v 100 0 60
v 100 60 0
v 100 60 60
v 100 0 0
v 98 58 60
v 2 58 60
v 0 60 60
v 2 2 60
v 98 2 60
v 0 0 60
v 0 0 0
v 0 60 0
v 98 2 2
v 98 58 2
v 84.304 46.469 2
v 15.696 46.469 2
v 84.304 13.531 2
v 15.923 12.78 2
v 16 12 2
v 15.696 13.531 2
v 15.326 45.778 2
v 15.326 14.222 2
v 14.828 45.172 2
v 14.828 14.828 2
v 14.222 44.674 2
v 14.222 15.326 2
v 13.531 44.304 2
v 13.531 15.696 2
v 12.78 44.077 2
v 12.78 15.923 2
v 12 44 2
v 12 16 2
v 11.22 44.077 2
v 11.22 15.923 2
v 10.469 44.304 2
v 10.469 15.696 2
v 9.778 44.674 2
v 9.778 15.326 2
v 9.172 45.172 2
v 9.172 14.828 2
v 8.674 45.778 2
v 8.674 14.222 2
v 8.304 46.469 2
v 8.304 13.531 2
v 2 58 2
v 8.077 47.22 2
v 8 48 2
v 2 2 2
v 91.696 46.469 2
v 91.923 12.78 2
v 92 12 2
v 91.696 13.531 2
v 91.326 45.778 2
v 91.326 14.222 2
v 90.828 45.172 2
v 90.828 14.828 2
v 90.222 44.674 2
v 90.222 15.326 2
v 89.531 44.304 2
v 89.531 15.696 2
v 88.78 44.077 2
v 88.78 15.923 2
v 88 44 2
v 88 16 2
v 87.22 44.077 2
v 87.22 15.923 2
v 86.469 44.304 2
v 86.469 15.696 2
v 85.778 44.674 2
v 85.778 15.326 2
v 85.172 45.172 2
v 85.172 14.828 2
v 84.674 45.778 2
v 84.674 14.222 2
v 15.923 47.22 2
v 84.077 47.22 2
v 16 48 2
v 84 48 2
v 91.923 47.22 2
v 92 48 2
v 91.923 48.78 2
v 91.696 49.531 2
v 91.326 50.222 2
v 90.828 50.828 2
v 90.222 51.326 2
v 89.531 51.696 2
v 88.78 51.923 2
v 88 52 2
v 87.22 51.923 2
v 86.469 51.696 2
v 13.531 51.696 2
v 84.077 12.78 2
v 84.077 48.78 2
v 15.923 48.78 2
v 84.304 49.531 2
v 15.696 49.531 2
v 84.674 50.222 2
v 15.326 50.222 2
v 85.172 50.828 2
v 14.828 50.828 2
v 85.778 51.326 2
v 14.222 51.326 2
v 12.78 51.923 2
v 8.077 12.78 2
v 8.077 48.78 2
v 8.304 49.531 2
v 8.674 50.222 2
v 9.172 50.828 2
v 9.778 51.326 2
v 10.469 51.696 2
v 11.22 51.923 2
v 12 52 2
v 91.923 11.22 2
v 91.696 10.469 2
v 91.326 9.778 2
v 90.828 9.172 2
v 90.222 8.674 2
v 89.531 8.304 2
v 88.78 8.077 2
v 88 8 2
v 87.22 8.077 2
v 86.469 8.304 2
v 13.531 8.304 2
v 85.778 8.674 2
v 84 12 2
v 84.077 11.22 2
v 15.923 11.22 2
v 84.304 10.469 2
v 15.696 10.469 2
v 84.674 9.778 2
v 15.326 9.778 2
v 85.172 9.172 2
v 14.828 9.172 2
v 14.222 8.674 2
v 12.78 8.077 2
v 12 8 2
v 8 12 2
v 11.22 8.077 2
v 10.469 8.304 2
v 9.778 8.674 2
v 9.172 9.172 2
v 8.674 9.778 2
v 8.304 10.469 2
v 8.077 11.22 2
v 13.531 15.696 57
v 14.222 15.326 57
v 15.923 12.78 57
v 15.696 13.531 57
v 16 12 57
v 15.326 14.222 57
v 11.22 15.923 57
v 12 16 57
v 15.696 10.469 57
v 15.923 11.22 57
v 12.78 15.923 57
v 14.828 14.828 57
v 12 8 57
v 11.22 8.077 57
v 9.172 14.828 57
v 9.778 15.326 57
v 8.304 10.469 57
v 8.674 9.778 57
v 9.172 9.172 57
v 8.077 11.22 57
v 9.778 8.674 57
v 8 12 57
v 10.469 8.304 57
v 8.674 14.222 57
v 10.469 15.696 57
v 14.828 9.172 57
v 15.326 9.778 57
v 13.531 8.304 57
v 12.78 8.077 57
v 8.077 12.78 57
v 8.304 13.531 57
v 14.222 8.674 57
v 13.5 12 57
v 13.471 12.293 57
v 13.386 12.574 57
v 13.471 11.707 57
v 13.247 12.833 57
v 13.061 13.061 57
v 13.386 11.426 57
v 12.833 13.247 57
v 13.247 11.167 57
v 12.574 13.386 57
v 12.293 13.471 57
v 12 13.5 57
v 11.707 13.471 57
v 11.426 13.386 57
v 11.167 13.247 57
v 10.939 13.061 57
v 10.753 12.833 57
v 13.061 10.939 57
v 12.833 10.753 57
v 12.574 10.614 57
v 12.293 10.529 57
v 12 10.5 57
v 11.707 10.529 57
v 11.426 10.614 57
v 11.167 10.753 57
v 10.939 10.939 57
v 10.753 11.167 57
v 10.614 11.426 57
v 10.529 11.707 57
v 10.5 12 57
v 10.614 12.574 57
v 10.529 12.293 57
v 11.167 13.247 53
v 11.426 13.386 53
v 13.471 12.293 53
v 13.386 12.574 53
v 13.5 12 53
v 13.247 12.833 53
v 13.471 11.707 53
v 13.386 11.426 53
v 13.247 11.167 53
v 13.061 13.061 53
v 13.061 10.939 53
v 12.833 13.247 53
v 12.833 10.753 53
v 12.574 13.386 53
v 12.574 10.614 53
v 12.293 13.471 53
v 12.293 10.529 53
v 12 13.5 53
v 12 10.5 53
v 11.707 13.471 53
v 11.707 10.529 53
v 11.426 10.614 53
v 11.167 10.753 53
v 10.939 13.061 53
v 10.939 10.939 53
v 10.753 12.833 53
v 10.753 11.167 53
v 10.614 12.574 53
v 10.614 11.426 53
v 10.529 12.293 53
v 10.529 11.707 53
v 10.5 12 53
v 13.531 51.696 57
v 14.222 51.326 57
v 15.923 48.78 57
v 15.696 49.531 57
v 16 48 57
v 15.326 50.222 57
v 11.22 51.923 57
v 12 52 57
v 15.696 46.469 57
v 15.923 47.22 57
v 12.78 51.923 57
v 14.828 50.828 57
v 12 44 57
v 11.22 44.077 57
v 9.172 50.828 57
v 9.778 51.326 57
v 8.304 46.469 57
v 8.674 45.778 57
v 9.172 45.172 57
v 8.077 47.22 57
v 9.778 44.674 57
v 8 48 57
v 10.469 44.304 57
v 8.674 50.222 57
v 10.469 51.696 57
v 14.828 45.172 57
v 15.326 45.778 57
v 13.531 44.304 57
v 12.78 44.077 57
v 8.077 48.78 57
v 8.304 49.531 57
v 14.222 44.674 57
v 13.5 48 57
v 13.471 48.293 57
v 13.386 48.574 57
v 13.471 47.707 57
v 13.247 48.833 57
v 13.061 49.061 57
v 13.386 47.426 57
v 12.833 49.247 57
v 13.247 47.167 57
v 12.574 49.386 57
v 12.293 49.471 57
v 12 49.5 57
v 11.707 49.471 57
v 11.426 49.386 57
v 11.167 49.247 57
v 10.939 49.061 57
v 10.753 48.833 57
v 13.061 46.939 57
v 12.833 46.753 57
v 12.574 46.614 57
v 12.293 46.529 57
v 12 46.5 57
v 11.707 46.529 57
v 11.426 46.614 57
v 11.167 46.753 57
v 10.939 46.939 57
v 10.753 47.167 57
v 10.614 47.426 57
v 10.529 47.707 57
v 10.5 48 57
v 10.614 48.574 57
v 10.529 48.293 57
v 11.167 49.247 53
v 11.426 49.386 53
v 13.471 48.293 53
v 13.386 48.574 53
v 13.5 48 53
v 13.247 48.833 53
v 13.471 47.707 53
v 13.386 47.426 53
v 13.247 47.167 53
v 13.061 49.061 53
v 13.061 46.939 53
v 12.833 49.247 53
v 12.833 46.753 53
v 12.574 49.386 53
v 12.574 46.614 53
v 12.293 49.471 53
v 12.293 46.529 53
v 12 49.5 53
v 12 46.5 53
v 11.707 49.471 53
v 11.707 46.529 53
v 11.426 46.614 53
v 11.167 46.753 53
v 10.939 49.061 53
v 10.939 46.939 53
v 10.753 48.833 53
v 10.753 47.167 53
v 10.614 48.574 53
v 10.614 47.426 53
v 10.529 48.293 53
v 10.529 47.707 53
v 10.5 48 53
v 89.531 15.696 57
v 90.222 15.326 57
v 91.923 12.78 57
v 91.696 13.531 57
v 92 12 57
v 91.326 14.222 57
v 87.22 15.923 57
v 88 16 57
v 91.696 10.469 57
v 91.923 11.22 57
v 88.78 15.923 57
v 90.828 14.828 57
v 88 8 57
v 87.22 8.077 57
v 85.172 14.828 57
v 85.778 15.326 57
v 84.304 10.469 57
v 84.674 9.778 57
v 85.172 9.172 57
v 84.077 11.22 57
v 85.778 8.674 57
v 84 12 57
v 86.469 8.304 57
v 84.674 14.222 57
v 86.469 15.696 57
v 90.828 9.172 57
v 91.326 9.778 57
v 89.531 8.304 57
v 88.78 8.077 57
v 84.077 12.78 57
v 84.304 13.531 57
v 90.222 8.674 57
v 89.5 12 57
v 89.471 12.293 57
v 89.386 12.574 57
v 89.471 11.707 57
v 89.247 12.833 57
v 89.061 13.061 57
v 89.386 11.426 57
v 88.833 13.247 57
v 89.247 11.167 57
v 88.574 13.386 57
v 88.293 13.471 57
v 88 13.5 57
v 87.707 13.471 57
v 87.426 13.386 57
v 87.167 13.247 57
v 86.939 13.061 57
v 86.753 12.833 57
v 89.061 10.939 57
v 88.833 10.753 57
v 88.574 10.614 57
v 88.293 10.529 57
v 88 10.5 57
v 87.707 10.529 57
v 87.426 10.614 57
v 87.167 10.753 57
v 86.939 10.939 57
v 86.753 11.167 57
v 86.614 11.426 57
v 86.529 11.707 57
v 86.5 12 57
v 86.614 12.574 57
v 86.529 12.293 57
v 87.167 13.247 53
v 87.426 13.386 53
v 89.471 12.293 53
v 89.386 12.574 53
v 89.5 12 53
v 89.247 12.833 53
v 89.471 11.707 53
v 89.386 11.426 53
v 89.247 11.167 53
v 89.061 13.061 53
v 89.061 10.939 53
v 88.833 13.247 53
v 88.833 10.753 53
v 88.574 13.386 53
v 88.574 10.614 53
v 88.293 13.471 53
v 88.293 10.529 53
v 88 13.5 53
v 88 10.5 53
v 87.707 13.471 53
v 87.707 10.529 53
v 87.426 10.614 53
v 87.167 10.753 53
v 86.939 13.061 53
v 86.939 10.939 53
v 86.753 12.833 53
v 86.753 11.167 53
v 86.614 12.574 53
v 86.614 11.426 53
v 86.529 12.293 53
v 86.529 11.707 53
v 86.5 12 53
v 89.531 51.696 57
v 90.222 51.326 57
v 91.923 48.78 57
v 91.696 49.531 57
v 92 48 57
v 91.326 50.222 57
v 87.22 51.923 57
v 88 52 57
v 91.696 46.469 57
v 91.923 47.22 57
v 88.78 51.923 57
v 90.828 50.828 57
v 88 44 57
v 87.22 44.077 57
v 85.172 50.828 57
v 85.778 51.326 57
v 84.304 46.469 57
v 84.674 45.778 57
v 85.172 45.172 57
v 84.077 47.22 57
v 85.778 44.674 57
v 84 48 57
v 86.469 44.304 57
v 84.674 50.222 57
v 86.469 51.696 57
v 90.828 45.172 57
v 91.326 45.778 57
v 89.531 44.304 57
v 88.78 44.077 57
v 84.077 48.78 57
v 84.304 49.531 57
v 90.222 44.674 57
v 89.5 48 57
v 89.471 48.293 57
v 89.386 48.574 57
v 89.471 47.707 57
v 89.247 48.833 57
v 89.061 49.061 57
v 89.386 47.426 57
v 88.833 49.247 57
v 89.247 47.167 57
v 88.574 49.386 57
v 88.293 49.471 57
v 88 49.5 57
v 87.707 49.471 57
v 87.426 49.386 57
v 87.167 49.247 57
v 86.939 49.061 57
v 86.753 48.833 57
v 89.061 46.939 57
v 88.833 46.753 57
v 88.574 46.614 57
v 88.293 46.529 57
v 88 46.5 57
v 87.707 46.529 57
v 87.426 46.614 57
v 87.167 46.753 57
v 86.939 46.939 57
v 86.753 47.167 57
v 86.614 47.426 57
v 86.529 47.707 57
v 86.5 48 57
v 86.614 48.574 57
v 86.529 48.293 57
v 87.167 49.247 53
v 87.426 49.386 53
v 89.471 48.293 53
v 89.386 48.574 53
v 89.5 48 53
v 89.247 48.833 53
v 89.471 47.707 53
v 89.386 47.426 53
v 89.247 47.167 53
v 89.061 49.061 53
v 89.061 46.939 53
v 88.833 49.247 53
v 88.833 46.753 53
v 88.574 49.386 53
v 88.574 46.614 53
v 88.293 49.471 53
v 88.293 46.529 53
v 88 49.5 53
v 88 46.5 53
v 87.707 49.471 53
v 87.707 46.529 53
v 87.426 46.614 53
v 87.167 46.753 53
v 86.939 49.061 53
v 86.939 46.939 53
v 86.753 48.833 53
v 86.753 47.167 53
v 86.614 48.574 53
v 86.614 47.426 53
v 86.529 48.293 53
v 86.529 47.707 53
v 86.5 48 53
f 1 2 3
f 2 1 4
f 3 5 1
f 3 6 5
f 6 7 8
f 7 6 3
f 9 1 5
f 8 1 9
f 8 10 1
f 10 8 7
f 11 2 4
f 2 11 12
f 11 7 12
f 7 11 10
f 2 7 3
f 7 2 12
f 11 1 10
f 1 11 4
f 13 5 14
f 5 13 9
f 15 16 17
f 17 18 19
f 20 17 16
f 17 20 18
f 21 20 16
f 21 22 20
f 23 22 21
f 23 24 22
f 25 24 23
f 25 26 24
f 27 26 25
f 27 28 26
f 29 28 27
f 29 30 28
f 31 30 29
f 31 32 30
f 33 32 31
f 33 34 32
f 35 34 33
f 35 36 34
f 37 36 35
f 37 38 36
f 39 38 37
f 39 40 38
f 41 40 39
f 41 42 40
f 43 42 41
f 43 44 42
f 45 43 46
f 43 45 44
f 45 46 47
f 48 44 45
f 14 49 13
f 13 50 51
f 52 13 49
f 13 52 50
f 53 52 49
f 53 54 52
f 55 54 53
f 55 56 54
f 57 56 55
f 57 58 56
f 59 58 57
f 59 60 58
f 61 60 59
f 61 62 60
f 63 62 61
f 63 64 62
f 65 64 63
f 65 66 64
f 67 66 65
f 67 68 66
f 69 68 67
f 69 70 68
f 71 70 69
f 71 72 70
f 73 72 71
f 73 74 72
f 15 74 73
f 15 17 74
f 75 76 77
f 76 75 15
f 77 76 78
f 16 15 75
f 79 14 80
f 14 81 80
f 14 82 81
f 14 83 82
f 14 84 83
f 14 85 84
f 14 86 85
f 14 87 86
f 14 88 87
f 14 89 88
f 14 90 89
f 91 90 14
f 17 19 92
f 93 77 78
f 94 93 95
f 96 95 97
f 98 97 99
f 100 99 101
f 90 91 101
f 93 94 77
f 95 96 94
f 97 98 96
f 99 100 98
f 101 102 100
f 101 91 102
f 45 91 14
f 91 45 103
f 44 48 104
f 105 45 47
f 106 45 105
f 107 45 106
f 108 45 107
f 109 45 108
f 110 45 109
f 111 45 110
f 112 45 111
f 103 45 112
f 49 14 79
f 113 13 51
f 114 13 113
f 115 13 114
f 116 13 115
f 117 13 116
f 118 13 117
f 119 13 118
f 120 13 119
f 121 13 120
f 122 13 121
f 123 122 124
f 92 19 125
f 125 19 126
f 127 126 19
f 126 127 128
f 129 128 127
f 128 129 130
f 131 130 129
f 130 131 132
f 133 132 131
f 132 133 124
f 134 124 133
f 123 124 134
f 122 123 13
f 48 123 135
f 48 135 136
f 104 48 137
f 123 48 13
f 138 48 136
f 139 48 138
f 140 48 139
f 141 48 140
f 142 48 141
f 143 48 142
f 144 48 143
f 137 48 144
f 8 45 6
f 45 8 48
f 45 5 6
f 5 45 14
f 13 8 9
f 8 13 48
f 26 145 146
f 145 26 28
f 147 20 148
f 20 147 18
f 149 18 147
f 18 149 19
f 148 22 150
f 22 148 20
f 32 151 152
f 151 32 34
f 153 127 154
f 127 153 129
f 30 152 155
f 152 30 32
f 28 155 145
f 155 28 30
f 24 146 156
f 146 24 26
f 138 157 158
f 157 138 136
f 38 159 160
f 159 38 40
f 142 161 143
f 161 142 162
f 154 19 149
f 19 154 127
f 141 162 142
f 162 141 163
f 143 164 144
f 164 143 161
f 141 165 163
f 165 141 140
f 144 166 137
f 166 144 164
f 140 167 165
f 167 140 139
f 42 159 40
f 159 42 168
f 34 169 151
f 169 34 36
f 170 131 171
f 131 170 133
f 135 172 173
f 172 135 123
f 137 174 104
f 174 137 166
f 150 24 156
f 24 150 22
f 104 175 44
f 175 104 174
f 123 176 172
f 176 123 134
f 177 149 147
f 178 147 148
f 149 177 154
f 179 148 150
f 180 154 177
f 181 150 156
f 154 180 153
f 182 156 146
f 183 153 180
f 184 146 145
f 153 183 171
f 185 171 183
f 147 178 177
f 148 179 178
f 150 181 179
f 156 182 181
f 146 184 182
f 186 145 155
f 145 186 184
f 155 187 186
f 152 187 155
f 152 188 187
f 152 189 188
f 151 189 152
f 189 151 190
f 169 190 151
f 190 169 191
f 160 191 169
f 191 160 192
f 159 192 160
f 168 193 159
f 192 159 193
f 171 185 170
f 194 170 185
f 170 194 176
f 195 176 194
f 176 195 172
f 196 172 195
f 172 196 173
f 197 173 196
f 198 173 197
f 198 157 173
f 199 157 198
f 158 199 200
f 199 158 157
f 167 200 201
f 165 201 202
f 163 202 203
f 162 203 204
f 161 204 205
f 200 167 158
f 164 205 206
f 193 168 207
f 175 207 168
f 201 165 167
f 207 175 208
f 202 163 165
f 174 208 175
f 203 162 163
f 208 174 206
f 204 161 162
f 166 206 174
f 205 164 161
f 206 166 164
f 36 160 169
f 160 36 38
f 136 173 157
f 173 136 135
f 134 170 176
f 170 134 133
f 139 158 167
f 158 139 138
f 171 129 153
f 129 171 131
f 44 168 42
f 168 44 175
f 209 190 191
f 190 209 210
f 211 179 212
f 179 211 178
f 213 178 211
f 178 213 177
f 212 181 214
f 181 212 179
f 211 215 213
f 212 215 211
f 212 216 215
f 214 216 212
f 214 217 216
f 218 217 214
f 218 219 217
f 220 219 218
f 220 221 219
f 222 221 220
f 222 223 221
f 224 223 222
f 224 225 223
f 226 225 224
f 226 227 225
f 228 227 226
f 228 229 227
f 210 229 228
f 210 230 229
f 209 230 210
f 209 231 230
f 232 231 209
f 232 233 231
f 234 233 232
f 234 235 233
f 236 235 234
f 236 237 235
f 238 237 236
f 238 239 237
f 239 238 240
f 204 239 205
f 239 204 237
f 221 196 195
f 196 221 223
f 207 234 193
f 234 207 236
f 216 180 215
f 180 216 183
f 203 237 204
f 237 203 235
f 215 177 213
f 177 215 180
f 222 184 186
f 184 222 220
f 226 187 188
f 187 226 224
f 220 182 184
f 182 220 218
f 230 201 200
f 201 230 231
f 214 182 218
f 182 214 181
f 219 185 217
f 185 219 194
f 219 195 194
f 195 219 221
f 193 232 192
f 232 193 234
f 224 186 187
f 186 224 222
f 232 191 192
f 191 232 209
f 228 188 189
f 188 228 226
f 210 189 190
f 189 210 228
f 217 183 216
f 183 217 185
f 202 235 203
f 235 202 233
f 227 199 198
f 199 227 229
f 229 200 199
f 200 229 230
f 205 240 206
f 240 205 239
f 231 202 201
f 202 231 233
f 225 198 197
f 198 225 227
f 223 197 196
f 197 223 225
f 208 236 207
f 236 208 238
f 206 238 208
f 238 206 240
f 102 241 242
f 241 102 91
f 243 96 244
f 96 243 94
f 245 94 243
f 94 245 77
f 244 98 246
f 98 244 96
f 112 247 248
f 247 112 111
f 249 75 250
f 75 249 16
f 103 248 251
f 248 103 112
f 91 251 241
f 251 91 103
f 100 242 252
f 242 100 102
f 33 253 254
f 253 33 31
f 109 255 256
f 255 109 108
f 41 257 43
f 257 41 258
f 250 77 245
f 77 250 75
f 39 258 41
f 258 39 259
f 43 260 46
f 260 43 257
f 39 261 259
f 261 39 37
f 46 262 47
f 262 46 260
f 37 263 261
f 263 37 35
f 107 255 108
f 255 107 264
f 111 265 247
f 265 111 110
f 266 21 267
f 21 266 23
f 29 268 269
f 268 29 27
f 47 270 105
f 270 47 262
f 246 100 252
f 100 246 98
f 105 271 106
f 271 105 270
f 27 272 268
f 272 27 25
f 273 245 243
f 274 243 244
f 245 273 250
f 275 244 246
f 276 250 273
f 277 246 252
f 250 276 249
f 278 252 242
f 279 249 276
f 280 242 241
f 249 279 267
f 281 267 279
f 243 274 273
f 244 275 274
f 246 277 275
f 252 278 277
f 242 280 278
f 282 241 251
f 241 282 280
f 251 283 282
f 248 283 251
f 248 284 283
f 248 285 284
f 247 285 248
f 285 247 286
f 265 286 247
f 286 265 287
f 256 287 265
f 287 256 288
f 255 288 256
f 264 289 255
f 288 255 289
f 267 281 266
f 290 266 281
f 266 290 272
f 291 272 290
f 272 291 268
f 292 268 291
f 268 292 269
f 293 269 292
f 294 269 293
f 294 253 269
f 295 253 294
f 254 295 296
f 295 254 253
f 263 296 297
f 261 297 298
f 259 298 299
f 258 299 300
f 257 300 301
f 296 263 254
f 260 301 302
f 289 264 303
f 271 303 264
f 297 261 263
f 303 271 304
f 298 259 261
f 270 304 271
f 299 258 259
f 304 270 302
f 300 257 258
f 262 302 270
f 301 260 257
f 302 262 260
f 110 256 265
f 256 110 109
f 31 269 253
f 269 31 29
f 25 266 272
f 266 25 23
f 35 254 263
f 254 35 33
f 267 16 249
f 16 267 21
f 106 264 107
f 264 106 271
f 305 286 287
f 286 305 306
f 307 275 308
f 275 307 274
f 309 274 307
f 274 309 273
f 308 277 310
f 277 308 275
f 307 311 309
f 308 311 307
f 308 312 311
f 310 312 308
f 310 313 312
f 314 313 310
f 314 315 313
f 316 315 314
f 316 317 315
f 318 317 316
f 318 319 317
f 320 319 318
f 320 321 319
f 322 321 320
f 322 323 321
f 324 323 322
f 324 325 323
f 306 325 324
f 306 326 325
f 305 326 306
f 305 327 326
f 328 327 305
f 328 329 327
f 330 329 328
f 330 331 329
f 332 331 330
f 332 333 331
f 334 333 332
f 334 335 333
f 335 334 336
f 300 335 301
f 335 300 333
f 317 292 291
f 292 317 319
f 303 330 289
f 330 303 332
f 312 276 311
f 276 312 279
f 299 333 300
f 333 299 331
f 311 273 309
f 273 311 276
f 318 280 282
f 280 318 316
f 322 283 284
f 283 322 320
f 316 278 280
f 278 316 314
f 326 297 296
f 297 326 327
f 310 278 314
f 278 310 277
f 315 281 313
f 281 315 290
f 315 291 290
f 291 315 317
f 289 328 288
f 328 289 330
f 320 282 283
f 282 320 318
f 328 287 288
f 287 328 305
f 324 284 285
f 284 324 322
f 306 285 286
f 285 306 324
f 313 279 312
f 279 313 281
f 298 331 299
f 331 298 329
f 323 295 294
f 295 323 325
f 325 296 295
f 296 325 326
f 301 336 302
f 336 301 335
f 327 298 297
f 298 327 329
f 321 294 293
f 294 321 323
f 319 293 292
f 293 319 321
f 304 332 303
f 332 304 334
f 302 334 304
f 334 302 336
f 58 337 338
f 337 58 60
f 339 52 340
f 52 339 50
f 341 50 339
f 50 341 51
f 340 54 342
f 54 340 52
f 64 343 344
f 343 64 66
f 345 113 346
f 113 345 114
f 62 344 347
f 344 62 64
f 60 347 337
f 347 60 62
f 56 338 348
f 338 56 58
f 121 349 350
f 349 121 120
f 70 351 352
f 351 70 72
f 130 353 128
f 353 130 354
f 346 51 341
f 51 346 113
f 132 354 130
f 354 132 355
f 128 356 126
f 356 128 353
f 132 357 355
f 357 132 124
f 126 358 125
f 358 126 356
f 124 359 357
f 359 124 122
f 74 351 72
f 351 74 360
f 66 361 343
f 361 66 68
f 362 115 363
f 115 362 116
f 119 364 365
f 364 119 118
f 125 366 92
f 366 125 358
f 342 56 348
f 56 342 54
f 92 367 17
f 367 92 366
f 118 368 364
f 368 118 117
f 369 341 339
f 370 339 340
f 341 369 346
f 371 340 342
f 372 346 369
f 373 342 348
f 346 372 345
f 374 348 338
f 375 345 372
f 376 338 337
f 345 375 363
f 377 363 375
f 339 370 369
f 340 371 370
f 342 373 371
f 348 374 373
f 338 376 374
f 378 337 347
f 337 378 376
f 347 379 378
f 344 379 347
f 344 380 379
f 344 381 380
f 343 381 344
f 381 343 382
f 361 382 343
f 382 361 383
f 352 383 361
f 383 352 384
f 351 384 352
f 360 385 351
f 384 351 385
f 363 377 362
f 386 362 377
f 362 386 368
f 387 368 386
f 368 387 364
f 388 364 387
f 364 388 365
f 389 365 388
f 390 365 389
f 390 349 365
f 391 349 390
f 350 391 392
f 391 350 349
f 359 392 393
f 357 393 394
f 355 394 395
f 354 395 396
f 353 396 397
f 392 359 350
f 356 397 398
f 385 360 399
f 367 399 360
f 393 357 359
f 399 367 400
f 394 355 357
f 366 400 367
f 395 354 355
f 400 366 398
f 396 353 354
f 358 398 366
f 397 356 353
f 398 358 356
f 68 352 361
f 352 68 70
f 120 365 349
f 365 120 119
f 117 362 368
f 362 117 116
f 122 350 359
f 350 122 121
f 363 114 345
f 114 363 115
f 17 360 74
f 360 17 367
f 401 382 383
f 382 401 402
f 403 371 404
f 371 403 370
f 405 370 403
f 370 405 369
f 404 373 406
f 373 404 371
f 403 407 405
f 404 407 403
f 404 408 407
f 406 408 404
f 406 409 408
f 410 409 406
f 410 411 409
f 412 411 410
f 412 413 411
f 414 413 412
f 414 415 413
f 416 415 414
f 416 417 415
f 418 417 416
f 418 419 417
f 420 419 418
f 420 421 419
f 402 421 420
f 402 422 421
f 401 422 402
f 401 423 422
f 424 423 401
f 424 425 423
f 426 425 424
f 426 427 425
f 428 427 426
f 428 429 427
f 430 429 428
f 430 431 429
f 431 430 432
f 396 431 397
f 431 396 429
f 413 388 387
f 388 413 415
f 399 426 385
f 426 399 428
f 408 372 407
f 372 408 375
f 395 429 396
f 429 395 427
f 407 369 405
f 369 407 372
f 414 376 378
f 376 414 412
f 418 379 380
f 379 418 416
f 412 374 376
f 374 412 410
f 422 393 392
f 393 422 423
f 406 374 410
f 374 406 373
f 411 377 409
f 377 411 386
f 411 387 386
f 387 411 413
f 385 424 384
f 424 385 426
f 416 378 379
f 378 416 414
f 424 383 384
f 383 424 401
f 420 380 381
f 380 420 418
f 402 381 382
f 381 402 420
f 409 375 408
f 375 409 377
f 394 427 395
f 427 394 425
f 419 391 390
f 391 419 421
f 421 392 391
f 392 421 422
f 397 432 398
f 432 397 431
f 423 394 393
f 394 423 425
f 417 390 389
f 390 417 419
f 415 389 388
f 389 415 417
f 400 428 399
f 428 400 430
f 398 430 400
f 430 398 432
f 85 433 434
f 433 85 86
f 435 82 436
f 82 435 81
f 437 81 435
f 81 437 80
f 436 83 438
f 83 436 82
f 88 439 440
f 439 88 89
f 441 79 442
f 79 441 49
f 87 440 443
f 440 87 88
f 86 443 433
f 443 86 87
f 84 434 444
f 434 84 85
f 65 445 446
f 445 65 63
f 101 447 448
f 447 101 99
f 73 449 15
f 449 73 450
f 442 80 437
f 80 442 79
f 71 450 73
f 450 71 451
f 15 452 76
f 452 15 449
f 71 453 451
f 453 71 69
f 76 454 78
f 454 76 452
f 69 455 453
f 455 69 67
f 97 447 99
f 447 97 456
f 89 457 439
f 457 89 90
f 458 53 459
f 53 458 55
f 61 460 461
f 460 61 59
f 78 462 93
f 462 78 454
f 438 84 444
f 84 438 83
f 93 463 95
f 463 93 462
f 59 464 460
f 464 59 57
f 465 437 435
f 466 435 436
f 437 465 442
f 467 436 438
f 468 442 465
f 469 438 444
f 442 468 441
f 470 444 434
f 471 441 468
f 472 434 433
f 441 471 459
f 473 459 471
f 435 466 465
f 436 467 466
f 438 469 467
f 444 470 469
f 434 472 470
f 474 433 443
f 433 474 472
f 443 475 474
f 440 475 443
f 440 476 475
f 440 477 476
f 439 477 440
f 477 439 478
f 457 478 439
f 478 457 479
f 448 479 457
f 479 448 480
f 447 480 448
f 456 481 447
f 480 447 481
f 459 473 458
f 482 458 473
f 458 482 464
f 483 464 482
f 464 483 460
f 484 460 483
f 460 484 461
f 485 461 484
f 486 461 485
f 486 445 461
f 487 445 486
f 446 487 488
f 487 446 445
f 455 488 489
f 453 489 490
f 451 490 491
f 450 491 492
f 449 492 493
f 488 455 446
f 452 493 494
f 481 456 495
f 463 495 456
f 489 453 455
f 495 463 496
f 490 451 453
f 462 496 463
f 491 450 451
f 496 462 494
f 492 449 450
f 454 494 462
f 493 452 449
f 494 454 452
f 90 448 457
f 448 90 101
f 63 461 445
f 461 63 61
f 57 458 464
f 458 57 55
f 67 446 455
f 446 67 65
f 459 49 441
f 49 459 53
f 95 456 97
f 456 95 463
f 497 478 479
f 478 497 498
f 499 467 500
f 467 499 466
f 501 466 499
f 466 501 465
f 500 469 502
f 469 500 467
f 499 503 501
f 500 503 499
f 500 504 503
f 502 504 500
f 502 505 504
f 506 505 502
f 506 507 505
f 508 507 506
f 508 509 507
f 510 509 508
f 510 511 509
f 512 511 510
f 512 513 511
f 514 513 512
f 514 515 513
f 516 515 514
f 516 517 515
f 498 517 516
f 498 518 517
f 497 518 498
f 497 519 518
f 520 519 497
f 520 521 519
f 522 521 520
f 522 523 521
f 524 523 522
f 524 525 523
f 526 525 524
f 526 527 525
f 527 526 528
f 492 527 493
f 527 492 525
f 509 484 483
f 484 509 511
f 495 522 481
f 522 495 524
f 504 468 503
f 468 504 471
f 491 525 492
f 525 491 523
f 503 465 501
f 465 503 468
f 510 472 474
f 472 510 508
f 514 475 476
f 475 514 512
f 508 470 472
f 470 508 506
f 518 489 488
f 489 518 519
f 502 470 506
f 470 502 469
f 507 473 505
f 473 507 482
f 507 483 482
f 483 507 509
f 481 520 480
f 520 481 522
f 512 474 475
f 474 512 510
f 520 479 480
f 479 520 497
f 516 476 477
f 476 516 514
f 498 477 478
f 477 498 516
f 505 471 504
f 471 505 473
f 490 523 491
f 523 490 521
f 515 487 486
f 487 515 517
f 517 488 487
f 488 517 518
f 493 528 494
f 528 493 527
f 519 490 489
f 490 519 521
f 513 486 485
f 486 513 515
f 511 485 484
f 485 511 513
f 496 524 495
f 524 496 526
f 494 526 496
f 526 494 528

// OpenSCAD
$fn = 32;

// ----------------------------------------------------------------------
// Enclosure box: bosses enclosure
// ----------------------------------------------------------------------

// --- parameters (mm) ---
box_l = 100;              // outer length, X
box_w = 60;               // outer width, Y
box_h = 60;               // outer height
wall_t = 2;               // wall thickness
boss_r = 4;               // corner boss radius
hole_r = 1.5;             // boss screw hole radius
boss_in = 12;             // boss inset from the corners

inner_h = box_h - wall_t;  // cavity depth
boss_h = inner_h - 2;  // corner boss height

difference() {
  union() {
    difference() {
      cube([box_l, box_w, box_h]);
      translate([wall_t, wall_t, wall_t])
        cube([box_l - 2 * wall_t, box_w - 2 * wall_t, box_h]);
    }
    for (sx = [0, 1], sy = [0, 1])
      translate([sx ? box_l - boss_in : boss_in,
                 sy ? box_w - boss_in : boss_in, wall_t - 1])
        difference() {
          cylinder(r = boss_r, h = boss_h);
          translate([0, 0, boss_h - 4])
            cylinder(r = hole_r, h = 5);
        }
  }
}
